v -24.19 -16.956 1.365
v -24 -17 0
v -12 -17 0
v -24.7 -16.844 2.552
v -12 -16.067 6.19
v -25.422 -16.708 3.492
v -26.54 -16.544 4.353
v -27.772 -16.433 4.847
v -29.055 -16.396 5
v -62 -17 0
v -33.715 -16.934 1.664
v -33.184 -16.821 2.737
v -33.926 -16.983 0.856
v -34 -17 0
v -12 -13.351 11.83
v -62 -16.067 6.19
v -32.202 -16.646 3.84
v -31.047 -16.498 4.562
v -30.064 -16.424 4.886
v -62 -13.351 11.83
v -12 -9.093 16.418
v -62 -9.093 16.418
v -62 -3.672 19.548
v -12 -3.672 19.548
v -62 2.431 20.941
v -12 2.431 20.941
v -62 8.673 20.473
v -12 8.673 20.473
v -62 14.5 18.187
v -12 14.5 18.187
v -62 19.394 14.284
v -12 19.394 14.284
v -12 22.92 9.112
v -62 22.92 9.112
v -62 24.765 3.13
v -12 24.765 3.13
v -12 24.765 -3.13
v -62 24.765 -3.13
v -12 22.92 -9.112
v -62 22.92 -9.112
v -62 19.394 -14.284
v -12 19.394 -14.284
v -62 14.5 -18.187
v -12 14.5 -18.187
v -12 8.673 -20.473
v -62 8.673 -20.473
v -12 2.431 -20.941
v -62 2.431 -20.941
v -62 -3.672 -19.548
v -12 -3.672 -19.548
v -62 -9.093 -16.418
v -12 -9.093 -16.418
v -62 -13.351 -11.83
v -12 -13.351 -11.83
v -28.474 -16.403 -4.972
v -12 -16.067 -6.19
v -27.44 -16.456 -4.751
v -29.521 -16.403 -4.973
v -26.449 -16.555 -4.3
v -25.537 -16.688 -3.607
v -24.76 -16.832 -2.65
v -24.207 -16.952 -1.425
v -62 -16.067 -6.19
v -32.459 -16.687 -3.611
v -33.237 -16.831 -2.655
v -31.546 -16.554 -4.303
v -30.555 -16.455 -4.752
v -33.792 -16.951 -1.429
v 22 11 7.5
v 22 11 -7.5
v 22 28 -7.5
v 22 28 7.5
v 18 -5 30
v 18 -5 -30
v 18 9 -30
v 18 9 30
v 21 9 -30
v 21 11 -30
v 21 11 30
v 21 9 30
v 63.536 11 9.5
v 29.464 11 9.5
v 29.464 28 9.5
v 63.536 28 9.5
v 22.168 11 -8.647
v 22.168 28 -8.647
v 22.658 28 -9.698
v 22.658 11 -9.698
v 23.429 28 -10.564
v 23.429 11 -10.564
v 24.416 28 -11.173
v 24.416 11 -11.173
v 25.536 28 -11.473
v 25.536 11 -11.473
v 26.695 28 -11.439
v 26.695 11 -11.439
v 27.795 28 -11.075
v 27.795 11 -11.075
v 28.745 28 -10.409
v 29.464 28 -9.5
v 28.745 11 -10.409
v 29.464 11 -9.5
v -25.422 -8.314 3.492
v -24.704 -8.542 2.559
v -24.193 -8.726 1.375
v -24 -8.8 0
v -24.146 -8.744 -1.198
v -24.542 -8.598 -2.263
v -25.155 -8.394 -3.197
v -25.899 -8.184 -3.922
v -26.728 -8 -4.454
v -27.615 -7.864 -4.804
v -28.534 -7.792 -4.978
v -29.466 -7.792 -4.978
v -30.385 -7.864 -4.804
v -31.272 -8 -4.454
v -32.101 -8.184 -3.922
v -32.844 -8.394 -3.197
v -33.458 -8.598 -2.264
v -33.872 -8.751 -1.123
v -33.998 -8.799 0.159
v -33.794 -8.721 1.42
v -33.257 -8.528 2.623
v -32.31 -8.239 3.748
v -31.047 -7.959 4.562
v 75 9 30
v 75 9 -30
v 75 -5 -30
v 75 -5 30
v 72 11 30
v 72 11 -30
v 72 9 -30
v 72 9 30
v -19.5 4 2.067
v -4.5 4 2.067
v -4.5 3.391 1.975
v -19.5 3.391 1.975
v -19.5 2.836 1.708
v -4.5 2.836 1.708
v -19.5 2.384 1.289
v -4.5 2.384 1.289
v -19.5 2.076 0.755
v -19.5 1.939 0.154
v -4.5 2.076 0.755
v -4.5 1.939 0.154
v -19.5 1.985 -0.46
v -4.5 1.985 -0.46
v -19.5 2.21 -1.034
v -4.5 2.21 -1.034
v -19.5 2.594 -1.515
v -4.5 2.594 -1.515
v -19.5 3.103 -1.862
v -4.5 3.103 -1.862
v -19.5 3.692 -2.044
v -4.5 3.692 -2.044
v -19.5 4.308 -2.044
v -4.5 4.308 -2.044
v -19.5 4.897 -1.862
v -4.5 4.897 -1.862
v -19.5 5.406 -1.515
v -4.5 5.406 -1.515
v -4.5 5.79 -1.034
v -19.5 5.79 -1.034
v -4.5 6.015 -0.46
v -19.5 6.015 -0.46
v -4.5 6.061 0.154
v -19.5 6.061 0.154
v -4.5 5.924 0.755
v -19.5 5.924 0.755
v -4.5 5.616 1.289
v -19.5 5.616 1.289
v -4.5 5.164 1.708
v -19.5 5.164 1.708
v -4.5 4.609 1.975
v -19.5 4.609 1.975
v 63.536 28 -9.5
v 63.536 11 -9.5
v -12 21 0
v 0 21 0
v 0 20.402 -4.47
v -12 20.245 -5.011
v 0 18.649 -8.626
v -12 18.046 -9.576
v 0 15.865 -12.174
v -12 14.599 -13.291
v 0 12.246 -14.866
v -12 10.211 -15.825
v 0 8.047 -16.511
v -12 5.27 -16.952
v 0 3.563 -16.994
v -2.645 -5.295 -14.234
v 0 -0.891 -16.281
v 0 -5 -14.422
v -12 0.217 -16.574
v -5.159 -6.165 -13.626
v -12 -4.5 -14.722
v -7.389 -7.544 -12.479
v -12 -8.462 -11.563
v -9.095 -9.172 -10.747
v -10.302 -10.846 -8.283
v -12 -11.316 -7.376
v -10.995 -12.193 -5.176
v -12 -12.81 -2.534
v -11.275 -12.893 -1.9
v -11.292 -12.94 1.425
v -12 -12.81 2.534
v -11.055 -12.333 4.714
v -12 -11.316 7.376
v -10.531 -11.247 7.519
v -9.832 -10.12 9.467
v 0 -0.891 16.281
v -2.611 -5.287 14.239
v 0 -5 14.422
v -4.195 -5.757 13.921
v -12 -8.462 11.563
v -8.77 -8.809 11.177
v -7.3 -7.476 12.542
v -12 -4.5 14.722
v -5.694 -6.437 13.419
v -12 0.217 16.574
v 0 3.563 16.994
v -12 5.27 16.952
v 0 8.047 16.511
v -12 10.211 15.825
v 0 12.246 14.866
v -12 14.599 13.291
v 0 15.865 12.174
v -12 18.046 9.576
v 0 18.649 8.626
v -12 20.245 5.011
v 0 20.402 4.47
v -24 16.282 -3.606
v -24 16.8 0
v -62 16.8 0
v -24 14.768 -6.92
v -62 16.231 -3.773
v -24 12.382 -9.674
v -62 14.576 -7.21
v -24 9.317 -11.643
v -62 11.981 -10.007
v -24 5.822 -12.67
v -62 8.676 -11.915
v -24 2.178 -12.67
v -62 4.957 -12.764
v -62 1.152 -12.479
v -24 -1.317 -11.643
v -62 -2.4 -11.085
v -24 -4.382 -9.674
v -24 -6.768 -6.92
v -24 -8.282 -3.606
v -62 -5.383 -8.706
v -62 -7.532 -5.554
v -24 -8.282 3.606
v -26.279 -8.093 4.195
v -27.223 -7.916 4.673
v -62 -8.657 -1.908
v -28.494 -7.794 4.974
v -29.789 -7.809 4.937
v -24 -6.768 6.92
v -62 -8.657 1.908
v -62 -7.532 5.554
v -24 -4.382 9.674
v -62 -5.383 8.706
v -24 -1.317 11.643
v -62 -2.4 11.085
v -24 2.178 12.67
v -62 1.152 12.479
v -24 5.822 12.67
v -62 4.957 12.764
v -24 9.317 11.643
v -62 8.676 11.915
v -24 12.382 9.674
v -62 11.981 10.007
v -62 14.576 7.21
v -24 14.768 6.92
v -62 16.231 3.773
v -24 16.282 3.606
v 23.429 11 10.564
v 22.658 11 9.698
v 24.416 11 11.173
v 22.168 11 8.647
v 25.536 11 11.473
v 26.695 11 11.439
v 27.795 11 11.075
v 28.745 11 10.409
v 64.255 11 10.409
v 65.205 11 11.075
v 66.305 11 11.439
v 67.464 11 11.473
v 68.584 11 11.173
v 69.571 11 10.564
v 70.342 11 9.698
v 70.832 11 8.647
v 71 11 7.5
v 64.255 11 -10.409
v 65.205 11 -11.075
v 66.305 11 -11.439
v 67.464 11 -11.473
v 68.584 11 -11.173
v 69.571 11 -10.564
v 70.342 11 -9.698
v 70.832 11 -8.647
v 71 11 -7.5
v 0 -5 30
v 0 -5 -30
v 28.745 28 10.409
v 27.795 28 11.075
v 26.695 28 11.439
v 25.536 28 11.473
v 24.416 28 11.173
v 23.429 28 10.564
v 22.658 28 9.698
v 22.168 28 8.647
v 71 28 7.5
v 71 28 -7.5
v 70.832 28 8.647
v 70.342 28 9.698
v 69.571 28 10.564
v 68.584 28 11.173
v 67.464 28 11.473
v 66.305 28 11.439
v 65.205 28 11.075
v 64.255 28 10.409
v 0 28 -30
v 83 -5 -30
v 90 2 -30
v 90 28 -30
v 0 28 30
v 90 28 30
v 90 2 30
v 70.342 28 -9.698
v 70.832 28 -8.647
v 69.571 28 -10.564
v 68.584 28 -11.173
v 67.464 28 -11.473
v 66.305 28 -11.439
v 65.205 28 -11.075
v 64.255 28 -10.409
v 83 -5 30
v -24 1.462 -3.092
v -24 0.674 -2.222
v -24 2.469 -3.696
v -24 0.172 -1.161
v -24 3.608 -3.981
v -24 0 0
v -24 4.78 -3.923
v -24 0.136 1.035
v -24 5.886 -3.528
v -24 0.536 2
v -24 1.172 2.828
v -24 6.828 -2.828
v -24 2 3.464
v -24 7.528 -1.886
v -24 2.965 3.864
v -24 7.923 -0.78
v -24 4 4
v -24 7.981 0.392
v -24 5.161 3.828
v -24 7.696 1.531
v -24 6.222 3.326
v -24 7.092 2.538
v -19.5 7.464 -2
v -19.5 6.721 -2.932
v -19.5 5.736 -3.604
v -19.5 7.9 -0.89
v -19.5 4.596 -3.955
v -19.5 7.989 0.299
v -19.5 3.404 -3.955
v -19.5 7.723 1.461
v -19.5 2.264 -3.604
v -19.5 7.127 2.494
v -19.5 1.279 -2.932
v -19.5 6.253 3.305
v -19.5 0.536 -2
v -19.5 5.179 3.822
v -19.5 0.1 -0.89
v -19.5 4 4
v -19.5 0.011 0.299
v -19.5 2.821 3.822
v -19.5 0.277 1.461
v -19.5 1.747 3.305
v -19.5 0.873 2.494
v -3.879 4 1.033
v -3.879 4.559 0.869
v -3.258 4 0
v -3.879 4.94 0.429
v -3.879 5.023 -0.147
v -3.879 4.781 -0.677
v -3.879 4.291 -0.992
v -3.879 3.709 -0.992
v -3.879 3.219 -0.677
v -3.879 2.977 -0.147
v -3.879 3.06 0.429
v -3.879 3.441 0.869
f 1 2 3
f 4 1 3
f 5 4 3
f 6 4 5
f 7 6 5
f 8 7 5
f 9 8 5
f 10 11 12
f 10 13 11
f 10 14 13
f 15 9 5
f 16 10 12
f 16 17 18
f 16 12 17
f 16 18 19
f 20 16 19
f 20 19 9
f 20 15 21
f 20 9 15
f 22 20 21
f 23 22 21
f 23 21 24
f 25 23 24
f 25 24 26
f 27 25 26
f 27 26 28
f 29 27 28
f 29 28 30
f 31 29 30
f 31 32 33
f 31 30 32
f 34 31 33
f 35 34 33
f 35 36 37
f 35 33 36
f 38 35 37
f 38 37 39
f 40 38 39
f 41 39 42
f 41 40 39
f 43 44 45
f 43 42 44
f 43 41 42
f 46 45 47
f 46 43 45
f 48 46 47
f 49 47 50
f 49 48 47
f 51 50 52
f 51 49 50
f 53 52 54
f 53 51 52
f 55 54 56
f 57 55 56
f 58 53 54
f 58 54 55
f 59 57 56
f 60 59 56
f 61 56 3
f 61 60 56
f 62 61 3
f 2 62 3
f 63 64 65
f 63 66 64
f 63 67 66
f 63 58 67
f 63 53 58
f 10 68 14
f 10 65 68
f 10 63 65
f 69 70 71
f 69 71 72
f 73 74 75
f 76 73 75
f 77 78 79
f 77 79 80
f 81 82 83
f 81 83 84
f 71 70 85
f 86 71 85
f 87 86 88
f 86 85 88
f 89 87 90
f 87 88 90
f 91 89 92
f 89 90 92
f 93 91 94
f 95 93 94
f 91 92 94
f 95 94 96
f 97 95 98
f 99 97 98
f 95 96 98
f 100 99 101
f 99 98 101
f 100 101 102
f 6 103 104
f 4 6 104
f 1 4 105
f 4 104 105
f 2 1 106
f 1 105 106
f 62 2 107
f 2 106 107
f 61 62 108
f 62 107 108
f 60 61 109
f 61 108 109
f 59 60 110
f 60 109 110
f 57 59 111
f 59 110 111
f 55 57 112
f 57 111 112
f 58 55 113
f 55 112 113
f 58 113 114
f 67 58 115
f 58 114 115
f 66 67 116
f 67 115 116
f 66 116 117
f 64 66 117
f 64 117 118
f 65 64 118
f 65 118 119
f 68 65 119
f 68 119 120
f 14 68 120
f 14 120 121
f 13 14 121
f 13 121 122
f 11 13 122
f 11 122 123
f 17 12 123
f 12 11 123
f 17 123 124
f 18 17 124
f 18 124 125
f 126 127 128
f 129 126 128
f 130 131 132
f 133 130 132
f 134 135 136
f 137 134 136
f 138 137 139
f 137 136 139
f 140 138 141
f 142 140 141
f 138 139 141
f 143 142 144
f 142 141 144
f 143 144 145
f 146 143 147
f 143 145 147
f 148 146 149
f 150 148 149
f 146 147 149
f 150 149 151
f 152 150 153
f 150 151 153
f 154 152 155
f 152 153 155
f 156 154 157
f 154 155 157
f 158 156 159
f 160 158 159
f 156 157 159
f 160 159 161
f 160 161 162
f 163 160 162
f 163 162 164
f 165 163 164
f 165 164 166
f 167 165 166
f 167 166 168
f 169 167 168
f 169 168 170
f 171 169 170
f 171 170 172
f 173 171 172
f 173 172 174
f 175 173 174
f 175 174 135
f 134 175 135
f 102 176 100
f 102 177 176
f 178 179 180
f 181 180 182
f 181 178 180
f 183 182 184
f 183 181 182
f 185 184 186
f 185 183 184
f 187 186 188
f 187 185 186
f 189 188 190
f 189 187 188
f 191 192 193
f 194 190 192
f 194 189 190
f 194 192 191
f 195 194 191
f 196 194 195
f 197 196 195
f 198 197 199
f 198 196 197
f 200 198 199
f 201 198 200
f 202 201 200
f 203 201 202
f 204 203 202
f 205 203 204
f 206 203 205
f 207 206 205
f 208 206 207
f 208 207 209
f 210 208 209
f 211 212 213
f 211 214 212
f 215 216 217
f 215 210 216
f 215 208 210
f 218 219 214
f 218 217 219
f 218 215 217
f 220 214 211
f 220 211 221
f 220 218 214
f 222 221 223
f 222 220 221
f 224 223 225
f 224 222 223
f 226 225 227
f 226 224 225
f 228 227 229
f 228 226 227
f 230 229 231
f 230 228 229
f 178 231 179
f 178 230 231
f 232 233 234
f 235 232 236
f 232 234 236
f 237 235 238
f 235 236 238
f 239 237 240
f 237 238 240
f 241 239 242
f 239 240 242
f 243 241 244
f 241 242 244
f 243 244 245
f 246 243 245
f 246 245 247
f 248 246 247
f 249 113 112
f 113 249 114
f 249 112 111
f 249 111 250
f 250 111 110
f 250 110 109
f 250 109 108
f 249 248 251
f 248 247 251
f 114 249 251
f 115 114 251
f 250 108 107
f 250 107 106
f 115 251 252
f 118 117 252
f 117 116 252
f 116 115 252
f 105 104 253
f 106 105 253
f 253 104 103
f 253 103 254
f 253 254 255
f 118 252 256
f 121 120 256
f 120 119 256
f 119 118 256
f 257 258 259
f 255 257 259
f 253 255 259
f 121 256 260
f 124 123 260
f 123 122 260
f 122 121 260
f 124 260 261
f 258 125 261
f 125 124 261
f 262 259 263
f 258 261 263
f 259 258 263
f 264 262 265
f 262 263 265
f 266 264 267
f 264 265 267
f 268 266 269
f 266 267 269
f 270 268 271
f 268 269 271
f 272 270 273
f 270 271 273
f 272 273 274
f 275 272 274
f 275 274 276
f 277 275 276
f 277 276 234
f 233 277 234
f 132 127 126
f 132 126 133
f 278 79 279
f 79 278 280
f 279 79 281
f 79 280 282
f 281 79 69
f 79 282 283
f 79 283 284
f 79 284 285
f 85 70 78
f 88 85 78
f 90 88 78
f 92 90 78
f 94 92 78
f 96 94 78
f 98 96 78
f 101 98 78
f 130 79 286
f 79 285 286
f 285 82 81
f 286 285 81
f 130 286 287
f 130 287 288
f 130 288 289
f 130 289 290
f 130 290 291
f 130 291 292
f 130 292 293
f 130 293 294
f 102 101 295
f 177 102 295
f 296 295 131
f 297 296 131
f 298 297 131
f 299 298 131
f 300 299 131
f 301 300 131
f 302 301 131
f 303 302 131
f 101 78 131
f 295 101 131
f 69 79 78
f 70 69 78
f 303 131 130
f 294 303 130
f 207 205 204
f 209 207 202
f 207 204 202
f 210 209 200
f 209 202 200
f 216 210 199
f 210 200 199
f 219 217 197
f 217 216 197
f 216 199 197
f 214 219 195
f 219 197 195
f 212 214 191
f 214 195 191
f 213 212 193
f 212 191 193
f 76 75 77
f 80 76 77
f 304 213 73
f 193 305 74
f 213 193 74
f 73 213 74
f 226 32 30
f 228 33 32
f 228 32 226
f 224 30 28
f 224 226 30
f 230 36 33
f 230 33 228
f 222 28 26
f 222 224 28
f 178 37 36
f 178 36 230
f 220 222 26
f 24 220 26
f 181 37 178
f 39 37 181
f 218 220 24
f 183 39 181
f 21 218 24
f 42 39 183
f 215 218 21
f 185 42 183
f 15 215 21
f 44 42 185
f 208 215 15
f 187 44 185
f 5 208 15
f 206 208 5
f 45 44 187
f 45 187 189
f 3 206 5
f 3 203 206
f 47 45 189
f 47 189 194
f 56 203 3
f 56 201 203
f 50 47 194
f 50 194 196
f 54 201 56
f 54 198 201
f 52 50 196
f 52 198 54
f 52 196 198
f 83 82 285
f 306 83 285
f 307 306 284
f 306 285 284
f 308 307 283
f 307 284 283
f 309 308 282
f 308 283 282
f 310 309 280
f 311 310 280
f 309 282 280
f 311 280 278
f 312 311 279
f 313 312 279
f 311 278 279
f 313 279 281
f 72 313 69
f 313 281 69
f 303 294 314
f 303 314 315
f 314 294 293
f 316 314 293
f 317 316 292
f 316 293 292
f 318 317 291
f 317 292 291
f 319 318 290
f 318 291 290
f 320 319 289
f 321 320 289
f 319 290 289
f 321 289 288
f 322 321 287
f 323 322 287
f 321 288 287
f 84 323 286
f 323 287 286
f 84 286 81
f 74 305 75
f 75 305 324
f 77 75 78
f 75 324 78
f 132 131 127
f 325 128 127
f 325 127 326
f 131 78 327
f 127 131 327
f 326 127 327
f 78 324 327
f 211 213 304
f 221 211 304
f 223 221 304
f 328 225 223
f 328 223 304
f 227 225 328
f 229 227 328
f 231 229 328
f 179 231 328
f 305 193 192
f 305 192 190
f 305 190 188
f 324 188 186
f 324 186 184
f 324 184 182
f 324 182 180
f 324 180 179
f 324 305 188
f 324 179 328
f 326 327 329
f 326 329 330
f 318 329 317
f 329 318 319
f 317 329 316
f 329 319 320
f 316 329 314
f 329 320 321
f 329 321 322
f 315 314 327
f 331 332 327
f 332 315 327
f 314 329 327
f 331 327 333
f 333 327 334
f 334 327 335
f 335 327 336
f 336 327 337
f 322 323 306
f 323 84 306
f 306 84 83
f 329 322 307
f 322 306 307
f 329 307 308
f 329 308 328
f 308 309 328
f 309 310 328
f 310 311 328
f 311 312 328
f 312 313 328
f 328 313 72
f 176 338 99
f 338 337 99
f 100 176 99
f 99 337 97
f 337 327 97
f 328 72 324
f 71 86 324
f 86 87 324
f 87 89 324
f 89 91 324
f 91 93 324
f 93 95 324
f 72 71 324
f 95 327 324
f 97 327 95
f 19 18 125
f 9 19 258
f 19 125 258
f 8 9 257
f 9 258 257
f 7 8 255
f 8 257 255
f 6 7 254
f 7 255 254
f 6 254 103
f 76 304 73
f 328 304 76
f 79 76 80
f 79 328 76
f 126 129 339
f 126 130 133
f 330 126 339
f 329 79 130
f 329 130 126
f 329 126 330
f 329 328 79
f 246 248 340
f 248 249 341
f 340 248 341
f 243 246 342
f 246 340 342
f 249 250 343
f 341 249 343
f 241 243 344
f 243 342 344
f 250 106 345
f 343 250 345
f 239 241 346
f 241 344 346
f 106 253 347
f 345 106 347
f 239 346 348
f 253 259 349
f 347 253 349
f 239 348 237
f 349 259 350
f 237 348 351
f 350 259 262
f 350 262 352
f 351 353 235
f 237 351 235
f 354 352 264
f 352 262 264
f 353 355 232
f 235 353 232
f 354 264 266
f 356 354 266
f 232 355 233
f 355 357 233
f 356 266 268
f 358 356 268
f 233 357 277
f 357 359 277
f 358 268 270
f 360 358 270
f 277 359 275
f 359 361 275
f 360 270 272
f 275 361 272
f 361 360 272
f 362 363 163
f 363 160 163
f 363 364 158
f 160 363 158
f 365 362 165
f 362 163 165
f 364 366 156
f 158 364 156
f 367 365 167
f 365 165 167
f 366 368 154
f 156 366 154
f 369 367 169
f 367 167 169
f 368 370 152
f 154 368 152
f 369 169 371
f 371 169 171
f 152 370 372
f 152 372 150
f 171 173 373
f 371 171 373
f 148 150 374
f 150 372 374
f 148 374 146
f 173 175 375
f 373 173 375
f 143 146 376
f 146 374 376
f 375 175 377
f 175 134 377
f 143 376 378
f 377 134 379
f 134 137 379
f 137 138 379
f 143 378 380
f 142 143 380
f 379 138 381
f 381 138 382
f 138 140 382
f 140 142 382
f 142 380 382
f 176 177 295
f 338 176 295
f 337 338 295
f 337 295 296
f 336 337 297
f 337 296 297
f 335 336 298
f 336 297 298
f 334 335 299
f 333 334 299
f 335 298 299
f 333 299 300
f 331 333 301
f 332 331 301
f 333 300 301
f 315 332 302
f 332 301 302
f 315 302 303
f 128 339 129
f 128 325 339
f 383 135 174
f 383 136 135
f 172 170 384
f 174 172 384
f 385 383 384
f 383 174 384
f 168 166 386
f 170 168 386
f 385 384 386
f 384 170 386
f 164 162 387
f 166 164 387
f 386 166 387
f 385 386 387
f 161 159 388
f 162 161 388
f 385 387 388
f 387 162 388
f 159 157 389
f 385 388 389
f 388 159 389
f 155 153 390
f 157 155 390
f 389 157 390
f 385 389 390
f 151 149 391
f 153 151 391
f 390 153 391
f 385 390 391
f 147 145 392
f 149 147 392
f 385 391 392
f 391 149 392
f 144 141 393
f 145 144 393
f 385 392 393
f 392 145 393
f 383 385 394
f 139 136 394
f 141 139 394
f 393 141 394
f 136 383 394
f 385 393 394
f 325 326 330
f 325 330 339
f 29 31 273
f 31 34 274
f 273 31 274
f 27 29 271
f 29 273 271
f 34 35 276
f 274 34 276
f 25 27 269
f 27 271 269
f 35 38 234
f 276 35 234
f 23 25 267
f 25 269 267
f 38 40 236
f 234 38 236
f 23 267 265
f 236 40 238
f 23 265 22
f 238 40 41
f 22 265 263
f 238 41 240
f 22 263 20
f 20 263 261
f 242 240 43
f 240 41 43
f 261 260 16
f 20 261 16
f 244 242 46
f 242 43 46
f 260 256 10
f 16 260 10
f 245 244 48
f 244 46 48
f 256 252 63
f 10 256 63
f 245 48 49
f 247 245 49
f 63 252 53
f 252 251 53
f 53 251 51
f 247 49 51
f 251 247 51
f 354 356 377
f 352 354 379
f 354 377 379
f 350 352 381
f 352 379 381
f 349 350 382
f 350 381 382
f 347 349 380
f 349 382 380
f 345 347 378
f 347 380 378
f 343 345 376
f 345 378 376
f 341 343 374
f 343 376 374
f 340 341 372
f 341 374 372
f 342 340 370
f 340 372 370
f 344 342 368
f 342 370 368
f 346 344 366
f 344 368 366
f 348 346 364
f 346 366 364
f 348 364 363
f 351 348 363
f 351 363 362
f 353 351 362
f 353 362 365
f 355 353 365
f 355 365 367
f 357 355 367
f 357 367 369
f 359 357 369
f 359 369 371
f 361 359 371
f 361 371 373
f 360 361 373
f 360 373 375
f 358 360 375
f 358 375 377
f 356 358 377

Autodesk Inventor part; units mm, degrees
ref_plane "Plan de construction1" through (90, 28, -30) normal (0, 0, 1) x (1, 0, 0)
sketch "Esquisse1" plane through (90, 28, -30) normal (0, 0, 1) x (1, 0, 0)
  line L0 (0, 0) -> (-90, 0)
  line L1 (0, 0) -> (0, -26)
  line L2 (0, -26) -> (-7, -33)
  line L3 (-7, -33) -> (-15, -33)
  line L4 (-15, -19) -> (-15, -33)
  line L5 (-15, -19) -> (-18, -19)
  line L6 (-69, -17) -> (-18, -17)
  line L7 (-72, -19) -> (-69, -19)
  line L8 (-72, -33) -> (-72, -19)
  line L9 (-90, -33) -> (-72, -33)
  line L10 (-90, -33) -> (-90, 0)
  line L11 (-69, -17) -> (-69, -19)
  line L12 (-18, -17) -> (-18, -19)
  dimension "d10" = 17
  dimension "d11" = 16
  dimension "d12" = 18
  dimension "d13" = 15
  dimension "d14" = 3
  dimension "d15" = 2
  dimension "d17" = 3
  dimension "d18" = 2
  dimension "d19" = 51
extrude "Extrusion1" add sketch "Esquisse1" along normal blind 60
sketch "Esquisse2" plane through (21, 11, -30) normal (0, -1, 0) x (1, 0, 0)
  line L0 (42.535898, 20.5) -> (8.464102, 20.5)
  line L1 (8.464102, 39.5) -> (42.535898, 39.5)
  arc A0 (50, 37.5) -> (42.535898, 39.5) centre (46, 37.5) ccw
  arc A1 (42.535898, 20.5) -> (50, 22.5) centre (46, 22.5) ccw
  line L2 (50, 37.5) -> (50, 22.5)
  arc A2 (8.464102, 39.5) -> (1, 37.5) centre (5, 37.5) ccw
  line L3 (1, 22.5) -> (1, 37.5)
  arc A3 (1, 22.5) -> (8.464102, 20.5) centre (5, 22.5) ccw
  line L4 (51, 60) -> (0, 60)
  line L5 (0, 0) -> (0, 60)
  line L6 (0, 0) -> (51, 0)
  line L7 (51, 0) -> (51, 60)
extrude "Extrusion2" cut sketch "Esquisse2" against normal through all contours L0 A3 L3 A2 L1 A0 L2 A1
ref_plane "Plan de construction2" through (18, -5, 0) normal (0, 0, 1) x (1, 0, 0)
sketch "Esquisse3" plane through (18, -5, 0) normal (0, 0, 1) x (1, 0, 0)
  line L0 (-80, 34) -> (-80, -16)
  line L1 (-42, -7.5) -> (-42, 21.8)
  line L2 (-80, 9) -> (-42, 9)
  line L3 (-42, 9) -> (-42, 21.8)
  line L4 (-42, 21.8) -> (-80, 21.8)
  line L5 (-80, 21.8) -> (-80, 9)
  line L6 (-30, -12) -> (-30, 26)
  line L7 (-80, 9) -> (-30, 9)
  line L8 (-30, 9) -> (-30, -12)
  line L9 (-30, -12) -> (-80, -12)
  line L10 (-80, -12) -> (-80, 9)
  line L11 (-18, 0) -> (-18, 26)
  line L12 (-30, 9) -> (-18, 9)
  line L13 (-18, 9) -> (-18, 26)
  line L14 (-18, 26) -> (-30, 26)
  line L15 (-30, 26) -> (-30, 9)
  line L16 (0, 14) -> (0, 0)
  line L17 (0, 7) -> (-22.134302, 7)
  line L18 (-18, 0) -> (-18, 33)
  dimension "d20" = 21
  dimension "d21" = 12.8
  dimension "d22" = 12
  dimension "d23" = 62
  dimension "d24" = 17
  dimension "d29" = 2
  dimension "d30" = 38
revolve "Révolution1" add sketch "Esquisse3" angle 360 about axis through (-62, 4, 0) along (1, 0, 0) contours L6 L14 L11 L12 | L2 L7 L6 L9 L0
revolve "Révolution2" cut sketch "Esquisse3" angle 360 about axis through (-62, 4, 0) along (1, 0, 0) contours L4 L1 L2 L0
sketch "Esquisse5" plane through (18, -5, 0) normal (0, 0, 1) x (1, 0, 0)
  arc A0 (-18, 0) -> (-30, -12) centre (-18, -12) ccw
  line L0 (-18, 0) -> (-18, 0)
  line L1 (-30, 9) -> (-18, 9) projected
  line L2 (-18, -8) -> (-18, 0) projected
  line L3 (-18, -12) -> (-30, -12)
  line L4 (-18, 0) -> (0, 0) projected
  line L5 (-30, -8) -> (-30, 26) projected
  dimension "d31" = 12
sketch "Esquisse5 outline for Extrusion3" plane through (18, -5, 0) normal (0, 0, 1) x (1, 0, 0)
  arc A0 (-18, 0) -> (-30, -12) centre (-18, -12) ccw
  line L0 (-18, -8) -> (-18, 0)
  line L1 (-30, -12) -> (-18, -8)
extrude "Extrusion3" cut sketch "Esquisse5 outline for Extrusion3" along normal through all both and the other way through all
ref_plane "Plan de construction3" through (-37, 4, 0) normal (0, -1, 0) x (1, 0, 0)
sketch "Esquisse6" plane through (-37, 4, 0) normal (0, -1, 0) x (1, 0, 0)
  arc A0 (5.953227, 4.562013) -> (11.578201, 3.492329) centre (7.999875, -0.000026) ccw
  circle A1 centre (7.999875, -0.000026) radius 5.000096
  dimension "d26" = 5.0001
extrude "Extrusion4" cut sketch "Esquisse6" along normal through all
sketch "Esquisse7" plane through (-24, 4, 0) normal (-1, 0, 0) x (0, 0, 1)
  circle A0 centre (0, 0) radius 12.8 projected
hole "Perçage1" at (-24, 4, 0) direction (1, 0, 0) diameter 4.134 depth 19.5 tip angle 118 counterbore diameter 8 counterbore depth 4.5 thread size "M5x0.8" class "6H" standard "ISO Metric profile"
sketch "Esquisse8" plane through (-24, 4, 0) normal (-1, 0, 0) x (0, 0, 1)
  circle A0 centre (0, 0) radius 4 projected
  circle A1 centre (0, 0) radius 12.8 projected
  line L0 (-12.8, 0) -> (12.8, 0)
properties part number "crosse" material "Acier doux"
